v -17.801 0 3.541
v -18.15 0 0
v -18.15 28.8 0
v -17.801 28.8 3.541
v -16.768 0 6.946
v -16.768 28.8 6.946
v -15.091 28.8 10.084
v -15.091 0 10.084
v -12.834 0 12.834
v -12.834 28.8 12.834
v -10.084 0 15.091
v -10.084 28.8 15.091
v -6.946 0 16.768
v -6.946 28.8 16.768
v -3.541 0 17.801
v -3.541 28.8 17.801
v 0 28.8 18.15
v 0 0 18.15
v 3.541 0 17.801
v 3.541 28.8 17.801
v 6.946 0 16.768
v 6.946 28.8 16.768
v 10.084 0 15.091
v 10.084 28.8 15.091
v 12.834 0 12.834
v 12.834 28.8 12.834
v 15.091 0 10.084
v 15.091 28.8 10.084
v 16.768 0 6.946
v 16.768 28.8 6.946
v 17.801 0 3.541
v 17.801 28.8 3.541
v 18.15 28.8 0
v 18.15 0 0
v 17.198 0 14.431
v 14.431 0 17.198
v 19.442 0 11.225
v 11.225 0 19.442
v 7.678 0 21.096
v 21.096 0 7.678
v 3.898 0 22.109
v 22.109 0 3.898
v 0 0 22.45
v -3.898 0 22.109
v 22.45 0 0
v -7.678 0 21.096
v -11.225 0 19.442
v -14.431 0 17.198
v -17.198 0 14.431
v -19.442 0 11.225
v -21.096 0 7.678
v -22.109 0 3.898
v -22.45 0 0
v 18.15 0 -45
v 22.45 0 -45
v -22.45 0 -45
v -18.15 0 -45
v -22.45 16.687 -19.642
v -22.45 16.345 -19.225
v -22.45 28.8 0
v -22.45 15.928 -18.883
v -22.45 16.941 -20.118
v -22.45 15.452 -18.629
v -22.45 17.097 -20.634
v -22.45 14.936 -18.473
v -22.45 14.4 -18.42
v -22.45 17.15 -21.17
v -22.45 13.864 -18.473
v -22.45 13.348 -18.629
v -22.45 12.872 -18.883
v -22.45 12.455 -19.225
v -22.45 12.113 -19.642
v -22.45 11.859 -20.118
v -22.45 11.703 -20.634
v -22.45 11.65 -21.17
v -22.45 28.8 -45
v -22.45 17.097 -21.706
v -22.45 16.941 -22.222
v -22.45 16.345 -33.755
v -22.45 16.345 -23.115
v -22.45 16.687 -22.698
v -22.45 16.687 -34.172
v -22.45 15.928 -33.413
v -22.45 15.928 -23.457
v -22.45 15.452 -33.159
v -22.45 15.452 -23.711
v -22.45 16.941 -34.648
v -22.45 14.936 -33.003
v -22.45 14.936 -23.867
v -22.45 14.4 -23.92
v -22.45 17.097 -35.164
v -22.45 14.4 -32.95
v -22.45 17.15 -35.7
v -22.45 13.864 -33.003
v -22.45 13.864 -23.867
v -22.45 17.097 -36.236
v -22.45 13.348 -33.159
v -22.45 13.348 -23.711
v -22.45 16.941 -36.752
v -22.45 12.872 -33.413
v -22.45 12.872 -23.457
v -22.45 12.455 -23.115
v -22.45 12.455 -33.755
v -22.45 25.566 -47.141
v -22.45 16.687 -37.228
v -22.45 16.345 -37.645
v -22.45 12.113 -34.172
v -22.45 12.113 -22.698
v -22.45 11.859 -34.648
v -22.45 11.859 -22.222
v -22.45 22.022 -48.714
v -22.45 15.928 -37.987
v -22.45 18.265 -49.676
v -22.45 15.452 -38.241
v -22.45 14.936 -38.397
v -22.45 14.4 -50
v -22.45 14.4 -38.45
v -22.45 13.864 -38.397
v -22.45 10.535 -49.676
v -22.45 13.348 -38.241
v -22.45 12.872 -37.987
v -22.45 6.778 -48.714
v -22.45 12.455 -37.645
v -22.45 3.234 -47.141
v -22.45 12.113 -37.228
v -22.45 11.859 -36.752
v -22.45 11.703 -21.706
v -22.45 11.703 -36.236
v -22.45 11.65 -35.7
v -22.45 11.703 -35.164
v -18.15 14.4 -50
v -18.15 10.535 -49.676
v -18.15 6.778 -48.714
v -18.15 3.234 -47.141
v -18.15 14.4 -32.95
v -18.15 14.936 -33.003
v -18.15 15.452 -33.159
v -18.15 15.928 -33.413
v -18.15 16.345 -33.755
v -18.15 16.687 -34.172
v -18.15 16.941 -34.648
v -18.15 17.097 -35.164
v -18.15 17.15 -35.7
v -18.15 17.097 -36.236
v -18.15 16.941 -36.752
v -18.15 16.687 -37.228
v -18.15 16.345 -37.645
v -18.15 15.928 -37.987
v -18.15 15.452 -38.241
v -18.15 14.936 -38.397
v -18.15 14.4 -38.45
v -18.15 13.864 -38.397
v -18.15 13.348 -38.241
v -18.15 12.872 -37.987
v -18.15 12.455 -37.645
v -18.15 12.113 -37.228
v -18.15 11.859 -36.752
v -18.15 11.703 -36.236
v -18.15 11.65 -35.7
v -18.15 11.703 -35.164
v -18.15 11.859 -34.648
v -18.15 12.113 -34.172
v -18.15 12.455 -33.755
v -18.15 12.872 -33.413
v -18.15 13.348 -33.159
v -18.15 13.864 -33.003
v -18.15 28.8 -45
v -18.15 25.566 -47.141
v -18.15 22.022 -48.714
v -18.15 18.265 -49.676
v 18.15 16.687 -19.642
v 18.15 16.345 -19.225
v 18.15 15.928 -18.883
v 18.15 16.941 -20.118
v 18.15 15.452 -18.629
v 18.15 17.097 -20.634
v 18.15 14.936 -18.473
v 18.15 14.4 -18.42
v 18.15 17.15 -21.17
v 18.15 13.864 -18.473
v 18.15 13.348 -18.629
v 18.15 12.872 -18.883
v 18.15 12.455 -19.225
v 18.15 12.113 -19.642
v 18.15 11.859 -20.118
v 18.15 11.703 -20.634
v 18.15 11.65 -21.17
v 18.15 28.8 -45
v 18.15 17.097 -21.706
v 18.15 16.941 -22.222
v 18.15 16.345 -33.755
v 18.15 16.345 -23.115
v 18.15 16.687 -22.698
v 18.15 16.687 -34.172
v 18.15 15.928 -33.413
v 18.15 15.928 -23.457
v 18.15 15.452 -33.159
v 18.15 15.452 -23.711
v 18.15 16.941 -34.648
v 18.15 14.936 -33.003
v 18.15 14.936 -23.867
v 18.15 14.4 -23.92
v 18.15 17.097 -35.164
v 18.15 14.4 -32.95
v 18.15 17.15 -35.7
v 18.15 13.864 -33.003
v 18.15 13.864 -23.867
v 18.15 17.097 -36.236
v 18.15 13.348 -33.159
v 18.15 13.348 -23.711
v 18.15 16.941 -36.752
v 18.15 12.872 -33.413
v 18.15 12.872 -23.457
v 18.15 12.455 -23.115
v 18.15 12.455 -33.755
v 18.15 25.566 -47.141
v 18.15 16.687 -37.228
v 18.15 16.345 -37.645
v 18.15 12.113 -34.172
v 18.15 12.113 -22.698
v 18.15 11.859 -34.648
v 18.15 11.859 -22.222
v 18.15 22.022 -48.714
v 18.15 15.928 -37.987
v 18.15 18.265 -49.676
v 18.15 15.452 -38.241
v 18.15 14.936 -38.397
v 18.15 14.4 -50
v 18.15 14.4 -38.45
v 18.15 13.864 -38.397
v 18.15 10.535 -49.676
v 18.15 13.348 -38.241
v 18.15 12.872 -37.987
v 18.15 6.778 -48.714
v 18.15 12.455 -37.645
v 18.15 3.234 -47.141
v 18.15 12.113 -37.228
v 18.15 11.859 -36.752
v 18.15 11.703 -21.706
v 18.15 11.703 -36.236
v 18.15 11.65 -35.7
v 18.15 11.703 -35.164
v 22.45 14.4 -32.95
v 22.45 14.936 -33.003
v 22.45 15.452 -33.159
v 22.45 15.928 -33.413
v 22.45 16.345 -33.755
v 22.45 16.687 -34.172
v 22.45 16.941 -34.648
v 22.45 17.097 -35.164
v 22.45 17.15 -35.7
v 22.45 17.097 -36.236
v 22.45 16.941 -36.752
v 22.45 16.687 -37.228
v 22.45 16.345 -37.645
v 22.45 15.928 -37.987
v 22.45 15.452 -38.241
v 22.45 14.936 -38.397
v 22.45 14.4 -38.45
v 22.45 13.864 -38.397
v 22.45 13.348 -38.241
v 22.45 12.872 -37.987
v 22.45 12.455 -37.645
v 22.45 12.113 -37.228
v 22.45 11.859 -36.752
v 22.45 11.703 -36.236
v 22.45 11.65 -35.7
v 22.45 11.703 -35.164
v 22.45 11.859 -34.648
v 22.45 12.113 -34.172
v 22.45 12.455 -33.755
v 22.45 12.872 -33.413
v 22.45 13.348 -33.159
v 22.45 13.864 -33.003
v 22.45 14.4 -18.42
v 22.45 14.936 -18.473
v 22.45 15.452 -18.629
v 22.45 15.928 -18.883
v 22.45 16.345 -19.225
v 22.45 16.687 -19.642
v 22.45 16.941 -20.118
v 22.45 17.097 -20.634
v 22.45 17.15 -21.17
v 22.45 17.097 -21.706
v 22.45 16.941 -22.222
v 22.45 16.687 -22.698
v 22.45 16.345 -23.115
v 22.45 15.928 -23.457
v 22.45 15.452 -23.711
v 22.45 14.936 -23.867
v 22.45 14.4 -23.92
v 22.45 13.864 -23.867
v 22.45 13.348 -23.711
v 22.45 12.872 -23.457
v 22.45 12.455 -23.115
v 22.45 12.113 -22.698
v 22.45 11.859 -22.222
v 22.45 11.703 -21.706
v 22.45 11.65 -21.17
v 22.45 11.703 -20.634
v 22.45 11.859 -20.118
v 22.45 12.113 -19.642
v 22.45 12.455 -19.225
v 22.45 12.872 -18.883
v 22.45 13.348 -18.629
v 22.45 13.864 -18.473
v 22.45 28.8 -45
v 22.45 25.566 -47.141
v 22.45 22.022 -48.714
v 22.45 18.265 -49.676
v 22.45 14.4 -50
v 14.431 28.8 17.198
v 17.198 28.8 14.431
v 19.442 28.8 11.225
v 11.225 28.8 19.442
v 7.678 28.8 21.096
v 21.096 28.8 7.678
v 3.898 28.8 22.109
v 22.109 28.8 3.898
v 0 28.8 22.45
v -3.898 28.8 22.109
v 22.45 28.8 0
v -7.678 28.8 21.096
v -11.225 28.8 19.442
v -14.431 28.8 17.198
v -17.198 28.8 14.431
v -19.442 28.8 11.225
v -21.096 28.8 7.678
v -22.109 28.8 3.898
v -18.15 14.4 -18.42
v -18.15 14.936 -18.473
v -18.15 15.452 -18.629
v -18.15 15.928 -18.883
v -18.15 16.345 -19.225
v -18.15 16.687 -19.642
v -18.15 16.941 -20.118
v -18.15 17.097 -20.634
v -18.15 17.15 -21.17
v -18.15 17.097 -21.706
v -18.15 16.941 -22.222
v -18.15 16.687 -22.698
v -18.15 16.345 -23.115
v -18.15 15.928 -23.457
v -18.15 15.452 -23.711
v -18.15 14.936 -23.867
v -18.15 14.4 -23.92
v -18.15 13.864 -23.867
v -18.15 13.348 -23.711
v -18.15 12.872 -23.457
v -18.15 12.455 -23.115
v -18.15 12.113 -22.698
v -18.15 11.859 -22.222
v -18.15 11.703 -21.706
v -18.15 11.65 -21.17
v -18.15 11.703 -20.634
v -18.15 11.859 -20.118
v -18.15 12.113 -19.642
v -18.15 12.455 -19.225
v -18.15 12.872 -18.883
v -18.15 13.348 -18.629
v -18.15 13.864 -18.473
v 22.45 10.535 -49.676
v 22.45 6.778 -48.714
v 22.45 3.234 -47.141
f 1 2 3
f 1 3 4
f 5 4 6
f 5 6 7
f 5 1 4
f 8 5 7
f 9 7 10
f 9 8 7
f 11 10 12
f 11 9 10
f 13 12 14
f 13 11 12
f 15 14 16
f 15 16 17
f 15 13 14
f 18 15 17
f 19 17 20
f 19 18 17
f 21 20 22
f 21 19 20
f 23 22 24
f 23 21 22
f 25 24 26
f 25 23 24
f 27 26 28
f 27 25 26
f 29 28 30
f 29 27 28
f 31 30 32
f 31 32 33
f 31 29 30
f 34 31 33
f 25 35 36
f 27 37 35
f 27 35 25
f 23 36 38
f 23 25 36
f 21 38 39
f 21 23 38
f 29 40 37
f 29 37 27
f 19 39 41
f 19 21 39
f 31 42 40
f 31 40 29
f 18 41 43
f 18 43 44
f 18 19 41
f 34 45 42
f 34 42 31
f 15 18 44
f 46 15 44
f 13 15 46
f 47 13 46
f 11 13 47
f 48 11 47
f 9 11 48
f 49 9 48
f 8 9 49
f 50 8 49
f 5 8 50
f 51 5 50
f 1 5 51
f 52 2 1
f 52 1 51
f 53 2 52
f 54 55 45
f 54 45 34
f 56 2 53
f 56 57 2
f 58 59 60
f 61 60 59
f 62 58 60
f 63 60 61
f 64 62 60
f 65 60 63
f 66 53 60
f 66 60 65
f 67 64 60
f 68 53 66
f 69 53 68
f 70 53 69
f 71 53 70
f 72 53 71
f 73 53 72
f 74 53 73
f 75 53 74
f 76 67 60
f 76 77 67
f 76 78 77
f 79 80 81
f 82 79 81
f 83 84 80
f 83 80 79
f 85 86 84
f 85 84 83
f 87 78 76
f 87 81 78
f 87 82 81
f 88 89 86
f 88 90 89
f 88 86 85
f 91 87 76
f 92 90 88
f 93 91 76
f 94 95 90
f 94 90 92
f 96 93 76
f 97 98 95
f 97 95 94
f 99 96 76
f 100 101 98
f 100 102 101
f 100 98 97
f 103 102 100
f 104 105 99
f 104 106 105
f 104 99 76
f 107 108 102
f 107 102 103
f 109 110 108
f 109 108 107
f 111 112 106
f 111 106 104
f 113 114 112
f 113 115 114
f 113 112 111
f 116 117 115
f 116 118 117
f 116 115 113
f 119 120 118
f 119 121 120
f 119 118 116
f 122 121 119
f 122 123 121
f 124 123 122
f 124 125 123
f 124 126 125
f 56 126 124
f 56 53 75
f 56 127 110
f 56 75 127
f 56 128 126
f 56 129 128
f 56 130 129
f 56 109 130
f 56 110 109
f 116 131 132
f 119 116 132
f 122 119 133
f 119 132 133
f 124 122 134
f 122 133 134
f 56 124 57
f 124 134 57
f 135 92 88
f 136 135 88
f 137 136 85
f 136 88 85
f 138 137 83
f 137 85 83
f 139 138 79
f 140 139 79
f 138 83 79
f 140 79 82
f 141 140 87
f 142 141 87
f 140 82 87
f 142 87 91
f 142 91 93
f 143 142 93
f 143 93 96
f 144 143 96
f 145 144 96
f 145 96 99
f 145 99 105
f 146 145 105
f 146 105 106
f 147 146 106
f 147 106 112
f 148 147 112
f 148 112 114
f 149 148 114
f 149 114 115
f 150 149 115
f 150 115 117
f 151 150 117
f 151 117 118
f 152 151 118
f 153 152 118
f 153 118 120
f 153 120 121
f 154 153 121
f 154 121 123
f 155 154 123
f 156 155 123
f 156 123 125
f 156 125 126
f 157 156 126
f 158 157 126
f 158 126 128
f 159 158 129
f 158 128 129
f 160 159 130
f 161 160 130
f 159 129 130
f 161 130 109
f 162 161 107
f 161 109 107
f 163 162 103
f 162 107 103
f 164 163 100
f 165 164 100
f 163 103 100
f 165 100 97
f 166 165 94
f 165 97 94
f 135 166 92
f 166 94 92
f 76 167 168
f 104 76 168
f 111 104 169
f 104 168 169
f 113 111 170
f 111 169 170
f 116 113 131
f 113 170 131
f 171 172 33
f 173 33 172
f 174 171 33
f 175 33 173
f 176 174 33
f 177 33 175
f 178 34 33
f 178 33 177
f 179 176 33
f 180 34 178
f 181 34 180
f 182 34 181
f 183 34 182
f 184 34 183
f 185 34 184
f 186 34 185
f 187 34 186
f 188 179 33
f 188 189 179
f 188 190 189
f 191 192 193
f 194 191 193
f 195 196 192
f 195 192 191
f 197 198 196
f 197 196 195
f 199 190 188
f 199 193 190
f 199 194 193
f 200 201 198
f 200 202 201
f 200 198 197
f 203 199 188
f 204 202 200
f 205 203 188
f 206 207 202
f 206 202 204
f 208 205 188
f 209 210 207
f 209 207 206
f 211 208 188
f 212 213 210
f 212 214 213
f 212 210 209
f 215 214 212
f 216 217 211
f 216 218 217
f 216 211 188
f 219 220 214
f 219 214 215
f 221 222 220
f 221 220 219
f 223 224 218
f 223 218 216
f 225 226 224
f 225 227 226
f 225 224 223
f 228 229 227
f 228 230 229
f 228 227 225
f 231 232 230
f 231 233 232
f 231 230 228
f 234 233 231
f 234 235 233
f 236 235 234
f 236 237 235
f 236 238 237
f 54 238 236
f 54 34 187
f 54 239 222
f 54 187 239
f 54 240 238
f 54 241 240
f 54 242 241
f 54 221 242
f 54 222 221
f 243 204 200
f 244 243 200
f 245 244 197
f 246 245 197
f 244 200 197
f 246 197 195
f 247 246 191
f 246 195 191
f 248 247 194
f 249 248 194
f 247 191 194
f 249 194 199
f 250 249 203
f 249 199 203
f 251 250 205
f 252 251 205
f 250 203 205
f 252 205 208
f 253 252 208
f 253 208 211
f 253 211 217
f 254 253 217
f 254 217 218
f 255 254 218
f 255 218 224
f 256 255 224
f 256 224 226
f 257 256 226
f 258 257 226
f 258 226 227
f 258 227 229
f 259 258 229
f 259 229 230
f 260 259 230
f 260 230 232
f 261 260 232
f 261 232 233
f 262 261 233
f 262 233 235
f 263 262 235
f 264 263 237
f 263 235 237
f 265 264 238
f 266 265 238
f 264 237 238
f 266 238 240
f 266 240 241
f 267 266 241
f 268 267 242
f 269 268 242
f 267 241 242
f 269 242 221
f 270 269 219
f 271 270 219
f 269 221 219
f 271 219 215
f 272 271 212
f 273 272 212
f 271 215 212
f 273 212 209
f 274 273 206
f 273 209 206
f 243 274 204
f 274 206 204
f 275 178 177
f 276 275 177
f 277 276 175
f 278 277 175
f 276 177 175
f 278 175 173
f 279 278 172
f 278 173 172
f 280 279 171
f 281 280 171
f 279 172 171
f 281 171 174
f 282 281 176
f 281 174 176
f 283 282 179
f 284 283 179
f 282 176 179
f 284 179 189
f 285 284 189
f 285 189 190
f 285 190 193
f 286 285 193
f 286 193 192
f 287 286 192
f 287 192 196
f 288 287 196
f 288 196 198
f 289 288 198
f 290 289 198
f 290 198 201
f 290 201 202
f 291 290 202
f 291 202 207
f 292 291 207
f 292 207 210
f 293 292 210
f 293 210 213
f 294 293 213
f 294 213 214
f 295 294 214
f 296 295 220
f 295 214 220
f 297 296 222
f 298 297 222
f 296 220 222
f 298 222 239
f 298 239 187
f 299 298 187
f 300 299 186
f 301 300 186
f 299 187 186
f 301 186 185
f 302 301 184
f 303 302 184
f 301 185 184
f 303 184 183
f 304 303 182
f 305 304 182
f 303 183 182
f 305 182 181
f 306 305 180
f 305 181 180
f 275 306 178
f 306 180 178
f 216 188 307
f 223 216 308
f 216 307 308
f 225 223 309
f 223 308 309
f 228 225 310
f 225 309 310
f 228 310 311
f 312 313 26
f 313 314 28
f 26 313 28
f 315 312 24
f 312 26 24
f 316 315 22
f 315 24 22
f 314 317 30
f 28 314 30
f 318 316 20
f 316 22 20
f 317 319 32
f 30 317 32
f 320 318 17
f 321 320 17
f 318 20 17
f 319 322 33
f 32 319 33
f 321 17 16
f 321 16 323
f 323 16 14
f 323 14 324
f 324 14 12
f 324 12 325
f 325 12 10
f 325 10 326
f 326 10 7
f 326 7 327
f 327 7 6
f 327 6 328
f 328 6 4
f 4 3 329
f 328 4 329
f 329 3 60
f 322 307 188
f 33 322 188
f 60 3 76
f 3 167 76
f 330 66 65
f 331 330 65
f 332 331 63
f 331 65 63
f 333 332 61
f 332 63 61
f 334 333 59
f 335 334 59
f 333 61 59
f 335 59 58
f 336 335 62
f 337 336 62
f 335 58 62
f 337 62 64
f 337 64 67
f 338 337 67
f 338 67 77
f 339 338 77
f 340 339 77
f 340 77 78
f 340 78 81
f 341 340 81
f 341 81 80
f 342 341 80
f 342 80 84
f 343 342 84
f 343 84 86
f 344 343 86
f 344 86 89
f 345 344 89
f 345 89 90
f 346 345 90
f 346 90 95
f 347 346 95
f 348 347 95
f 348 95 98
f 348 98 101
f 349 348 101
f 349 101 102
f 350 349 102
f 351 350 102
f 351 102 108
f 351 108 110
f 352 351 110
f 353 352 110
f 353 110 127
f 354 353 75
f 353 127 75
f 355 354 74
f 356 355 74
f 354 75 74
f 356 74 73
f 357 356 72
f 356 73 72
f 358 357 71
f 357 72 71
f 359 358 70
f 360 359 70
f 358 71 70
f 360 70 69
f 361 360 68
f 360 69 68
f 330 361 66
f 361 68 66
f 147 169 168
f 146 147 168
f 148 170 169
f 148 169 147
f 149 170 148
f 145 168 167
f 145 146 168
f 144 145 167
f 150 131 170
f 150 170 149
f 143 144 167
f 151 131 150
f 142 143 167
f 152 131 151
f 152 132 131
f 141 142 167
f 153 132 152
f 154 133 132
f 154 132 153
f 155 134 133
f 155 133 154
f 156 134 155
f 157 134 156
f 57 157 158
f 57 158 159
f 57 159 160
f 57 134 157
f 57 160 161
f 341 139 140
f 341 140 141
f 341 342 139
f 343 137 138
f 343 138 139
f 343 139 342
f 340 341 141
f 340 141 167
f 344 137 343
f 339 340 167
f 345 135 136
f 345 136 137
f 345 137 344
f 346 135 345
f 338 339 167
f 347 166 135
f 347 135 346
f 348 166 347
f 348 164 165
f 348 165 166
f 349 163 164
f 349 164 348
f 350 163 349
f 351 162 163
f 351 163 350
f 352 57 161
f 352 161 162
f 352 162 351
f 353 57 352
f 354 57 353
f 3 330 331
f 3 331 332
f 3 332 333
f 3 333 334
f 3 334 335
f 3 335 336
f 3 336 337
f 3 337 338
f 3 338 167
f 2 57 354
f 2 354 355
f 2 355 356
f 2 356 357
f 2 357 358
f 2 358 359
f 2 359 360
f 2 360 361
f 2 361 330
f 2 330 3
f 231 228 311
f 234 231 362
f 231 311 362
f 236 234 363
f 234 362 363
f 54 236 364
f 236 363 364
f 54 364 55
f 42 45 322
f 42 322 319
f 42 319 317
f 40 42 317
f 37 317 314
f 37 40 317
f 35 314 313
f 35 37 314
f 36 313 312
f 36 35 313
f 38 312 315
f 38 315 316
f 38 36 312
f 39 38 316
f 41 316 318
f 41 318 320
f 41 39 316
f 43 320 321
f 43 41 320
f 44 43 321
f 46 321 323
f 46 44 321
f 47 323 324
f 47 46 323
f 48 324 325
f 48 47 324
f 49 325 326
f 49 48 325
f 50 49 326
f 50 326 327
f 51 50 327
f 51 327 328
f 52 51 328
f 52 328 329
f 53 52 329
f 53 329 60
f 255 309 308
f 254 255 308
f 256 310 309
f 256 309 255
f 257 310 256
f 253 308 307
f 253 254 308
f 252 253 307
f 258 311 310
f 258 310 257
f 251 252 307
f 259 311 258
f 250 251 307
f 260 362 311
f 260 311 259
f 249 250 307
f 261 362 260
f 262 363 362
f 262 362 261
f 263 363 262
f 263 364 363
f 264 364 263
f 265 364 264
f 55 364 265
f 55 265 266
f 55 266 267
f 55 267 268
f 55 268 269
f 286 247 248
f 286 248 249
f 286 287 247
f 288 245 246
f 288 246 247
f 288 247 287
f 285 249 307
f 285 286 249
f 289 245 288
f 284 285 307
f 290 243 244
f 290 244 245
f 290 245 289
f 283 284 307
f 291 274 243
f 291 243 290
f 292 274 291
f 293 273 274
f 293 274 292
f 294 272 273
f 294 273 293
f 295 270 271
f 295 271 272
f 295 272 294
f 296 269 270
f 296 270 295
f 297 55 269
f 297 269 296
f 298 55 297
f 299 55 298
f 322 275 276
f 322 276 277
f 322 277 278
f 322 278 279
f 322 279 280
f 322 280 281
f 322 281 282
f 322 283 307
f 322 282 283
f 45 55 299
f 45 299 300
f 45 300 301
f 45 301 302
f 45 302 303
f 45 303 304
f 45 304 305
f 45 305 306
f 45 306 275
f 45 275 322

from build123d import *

# Parameters (mm, degrees)
BOSS_EXTRUDE1_DEPTH  = 28.8
M5_CLEARANCE_HOLE1_D = 5.5
CUT_EXTRUDE1_DEPTH   = 45.9


with BuildPart() as part:
    # Sketch1 → Boss-Extrude1 (new body)
    with BuildSketch(Plane(origin=(0, 0, 0), x_dir=(1, 0, 0), z_dir=(0, 1, 0))):
        with BuildLine():
            Line((-22.45, 0), (-22.45, 50))
            Line((-22.45, 50), (-18.15, 50))
            Line((-18.15, 50), (-18.15, 0))
            ThreePointArc((-18.15, 0), (0, -18.15), (18.15, 0))
            Line((18.15, 0), (18.15, 50))
            Line((18.15, 50), (22.45, 50))
            Line((22.45, 50), (22.45, 0))
            ThreePointArc((22.45, 0), (0, -22.45), (-22.45, 0))
        make_face()
    extrude(amount=BOSS_EXTRUDE1_DEPTH)

    # M5 Clearance Hole1 (through all)
    with Locations(Plane(origin=(22.45, 0, 0), x_dir=(0, 0, -1), z_dir=(1, 0, 0))):
        with Locations((21.17, 14.4), (35.7, 14.4)):
            Hole(M5_CLEARANCE_HOLE1_D / 2)

    # Sketch5 → Cut-Extrude1 (cut, through all)
    with BuildSketch(Plane(origin=(22.45, 0, 0), x_dir=(0, 0, -1), z_dir=(1, 0, 0))):
        with BuildLine():
            Line((50, 0), (50, 14.4))
            ThreePointArc((50, 14.4), (48.714437262, 6.778320395), (45, 0))
            Line((45, 0), (50, 0))
        make_face()
        with BuildLine():
            Line((50, 28.8), (45, 28.8))
            ThreePointArc((45, 28.8), (48.714437262, 22.021679605), (50, 14.4))
            Line((50, 14.4), (50, 28.8))
        make_face()
    extrude(amount=-CUT_EXTRUDE1_DEPTH, mode=Mode.SUBTRACT)


solid = part.part
